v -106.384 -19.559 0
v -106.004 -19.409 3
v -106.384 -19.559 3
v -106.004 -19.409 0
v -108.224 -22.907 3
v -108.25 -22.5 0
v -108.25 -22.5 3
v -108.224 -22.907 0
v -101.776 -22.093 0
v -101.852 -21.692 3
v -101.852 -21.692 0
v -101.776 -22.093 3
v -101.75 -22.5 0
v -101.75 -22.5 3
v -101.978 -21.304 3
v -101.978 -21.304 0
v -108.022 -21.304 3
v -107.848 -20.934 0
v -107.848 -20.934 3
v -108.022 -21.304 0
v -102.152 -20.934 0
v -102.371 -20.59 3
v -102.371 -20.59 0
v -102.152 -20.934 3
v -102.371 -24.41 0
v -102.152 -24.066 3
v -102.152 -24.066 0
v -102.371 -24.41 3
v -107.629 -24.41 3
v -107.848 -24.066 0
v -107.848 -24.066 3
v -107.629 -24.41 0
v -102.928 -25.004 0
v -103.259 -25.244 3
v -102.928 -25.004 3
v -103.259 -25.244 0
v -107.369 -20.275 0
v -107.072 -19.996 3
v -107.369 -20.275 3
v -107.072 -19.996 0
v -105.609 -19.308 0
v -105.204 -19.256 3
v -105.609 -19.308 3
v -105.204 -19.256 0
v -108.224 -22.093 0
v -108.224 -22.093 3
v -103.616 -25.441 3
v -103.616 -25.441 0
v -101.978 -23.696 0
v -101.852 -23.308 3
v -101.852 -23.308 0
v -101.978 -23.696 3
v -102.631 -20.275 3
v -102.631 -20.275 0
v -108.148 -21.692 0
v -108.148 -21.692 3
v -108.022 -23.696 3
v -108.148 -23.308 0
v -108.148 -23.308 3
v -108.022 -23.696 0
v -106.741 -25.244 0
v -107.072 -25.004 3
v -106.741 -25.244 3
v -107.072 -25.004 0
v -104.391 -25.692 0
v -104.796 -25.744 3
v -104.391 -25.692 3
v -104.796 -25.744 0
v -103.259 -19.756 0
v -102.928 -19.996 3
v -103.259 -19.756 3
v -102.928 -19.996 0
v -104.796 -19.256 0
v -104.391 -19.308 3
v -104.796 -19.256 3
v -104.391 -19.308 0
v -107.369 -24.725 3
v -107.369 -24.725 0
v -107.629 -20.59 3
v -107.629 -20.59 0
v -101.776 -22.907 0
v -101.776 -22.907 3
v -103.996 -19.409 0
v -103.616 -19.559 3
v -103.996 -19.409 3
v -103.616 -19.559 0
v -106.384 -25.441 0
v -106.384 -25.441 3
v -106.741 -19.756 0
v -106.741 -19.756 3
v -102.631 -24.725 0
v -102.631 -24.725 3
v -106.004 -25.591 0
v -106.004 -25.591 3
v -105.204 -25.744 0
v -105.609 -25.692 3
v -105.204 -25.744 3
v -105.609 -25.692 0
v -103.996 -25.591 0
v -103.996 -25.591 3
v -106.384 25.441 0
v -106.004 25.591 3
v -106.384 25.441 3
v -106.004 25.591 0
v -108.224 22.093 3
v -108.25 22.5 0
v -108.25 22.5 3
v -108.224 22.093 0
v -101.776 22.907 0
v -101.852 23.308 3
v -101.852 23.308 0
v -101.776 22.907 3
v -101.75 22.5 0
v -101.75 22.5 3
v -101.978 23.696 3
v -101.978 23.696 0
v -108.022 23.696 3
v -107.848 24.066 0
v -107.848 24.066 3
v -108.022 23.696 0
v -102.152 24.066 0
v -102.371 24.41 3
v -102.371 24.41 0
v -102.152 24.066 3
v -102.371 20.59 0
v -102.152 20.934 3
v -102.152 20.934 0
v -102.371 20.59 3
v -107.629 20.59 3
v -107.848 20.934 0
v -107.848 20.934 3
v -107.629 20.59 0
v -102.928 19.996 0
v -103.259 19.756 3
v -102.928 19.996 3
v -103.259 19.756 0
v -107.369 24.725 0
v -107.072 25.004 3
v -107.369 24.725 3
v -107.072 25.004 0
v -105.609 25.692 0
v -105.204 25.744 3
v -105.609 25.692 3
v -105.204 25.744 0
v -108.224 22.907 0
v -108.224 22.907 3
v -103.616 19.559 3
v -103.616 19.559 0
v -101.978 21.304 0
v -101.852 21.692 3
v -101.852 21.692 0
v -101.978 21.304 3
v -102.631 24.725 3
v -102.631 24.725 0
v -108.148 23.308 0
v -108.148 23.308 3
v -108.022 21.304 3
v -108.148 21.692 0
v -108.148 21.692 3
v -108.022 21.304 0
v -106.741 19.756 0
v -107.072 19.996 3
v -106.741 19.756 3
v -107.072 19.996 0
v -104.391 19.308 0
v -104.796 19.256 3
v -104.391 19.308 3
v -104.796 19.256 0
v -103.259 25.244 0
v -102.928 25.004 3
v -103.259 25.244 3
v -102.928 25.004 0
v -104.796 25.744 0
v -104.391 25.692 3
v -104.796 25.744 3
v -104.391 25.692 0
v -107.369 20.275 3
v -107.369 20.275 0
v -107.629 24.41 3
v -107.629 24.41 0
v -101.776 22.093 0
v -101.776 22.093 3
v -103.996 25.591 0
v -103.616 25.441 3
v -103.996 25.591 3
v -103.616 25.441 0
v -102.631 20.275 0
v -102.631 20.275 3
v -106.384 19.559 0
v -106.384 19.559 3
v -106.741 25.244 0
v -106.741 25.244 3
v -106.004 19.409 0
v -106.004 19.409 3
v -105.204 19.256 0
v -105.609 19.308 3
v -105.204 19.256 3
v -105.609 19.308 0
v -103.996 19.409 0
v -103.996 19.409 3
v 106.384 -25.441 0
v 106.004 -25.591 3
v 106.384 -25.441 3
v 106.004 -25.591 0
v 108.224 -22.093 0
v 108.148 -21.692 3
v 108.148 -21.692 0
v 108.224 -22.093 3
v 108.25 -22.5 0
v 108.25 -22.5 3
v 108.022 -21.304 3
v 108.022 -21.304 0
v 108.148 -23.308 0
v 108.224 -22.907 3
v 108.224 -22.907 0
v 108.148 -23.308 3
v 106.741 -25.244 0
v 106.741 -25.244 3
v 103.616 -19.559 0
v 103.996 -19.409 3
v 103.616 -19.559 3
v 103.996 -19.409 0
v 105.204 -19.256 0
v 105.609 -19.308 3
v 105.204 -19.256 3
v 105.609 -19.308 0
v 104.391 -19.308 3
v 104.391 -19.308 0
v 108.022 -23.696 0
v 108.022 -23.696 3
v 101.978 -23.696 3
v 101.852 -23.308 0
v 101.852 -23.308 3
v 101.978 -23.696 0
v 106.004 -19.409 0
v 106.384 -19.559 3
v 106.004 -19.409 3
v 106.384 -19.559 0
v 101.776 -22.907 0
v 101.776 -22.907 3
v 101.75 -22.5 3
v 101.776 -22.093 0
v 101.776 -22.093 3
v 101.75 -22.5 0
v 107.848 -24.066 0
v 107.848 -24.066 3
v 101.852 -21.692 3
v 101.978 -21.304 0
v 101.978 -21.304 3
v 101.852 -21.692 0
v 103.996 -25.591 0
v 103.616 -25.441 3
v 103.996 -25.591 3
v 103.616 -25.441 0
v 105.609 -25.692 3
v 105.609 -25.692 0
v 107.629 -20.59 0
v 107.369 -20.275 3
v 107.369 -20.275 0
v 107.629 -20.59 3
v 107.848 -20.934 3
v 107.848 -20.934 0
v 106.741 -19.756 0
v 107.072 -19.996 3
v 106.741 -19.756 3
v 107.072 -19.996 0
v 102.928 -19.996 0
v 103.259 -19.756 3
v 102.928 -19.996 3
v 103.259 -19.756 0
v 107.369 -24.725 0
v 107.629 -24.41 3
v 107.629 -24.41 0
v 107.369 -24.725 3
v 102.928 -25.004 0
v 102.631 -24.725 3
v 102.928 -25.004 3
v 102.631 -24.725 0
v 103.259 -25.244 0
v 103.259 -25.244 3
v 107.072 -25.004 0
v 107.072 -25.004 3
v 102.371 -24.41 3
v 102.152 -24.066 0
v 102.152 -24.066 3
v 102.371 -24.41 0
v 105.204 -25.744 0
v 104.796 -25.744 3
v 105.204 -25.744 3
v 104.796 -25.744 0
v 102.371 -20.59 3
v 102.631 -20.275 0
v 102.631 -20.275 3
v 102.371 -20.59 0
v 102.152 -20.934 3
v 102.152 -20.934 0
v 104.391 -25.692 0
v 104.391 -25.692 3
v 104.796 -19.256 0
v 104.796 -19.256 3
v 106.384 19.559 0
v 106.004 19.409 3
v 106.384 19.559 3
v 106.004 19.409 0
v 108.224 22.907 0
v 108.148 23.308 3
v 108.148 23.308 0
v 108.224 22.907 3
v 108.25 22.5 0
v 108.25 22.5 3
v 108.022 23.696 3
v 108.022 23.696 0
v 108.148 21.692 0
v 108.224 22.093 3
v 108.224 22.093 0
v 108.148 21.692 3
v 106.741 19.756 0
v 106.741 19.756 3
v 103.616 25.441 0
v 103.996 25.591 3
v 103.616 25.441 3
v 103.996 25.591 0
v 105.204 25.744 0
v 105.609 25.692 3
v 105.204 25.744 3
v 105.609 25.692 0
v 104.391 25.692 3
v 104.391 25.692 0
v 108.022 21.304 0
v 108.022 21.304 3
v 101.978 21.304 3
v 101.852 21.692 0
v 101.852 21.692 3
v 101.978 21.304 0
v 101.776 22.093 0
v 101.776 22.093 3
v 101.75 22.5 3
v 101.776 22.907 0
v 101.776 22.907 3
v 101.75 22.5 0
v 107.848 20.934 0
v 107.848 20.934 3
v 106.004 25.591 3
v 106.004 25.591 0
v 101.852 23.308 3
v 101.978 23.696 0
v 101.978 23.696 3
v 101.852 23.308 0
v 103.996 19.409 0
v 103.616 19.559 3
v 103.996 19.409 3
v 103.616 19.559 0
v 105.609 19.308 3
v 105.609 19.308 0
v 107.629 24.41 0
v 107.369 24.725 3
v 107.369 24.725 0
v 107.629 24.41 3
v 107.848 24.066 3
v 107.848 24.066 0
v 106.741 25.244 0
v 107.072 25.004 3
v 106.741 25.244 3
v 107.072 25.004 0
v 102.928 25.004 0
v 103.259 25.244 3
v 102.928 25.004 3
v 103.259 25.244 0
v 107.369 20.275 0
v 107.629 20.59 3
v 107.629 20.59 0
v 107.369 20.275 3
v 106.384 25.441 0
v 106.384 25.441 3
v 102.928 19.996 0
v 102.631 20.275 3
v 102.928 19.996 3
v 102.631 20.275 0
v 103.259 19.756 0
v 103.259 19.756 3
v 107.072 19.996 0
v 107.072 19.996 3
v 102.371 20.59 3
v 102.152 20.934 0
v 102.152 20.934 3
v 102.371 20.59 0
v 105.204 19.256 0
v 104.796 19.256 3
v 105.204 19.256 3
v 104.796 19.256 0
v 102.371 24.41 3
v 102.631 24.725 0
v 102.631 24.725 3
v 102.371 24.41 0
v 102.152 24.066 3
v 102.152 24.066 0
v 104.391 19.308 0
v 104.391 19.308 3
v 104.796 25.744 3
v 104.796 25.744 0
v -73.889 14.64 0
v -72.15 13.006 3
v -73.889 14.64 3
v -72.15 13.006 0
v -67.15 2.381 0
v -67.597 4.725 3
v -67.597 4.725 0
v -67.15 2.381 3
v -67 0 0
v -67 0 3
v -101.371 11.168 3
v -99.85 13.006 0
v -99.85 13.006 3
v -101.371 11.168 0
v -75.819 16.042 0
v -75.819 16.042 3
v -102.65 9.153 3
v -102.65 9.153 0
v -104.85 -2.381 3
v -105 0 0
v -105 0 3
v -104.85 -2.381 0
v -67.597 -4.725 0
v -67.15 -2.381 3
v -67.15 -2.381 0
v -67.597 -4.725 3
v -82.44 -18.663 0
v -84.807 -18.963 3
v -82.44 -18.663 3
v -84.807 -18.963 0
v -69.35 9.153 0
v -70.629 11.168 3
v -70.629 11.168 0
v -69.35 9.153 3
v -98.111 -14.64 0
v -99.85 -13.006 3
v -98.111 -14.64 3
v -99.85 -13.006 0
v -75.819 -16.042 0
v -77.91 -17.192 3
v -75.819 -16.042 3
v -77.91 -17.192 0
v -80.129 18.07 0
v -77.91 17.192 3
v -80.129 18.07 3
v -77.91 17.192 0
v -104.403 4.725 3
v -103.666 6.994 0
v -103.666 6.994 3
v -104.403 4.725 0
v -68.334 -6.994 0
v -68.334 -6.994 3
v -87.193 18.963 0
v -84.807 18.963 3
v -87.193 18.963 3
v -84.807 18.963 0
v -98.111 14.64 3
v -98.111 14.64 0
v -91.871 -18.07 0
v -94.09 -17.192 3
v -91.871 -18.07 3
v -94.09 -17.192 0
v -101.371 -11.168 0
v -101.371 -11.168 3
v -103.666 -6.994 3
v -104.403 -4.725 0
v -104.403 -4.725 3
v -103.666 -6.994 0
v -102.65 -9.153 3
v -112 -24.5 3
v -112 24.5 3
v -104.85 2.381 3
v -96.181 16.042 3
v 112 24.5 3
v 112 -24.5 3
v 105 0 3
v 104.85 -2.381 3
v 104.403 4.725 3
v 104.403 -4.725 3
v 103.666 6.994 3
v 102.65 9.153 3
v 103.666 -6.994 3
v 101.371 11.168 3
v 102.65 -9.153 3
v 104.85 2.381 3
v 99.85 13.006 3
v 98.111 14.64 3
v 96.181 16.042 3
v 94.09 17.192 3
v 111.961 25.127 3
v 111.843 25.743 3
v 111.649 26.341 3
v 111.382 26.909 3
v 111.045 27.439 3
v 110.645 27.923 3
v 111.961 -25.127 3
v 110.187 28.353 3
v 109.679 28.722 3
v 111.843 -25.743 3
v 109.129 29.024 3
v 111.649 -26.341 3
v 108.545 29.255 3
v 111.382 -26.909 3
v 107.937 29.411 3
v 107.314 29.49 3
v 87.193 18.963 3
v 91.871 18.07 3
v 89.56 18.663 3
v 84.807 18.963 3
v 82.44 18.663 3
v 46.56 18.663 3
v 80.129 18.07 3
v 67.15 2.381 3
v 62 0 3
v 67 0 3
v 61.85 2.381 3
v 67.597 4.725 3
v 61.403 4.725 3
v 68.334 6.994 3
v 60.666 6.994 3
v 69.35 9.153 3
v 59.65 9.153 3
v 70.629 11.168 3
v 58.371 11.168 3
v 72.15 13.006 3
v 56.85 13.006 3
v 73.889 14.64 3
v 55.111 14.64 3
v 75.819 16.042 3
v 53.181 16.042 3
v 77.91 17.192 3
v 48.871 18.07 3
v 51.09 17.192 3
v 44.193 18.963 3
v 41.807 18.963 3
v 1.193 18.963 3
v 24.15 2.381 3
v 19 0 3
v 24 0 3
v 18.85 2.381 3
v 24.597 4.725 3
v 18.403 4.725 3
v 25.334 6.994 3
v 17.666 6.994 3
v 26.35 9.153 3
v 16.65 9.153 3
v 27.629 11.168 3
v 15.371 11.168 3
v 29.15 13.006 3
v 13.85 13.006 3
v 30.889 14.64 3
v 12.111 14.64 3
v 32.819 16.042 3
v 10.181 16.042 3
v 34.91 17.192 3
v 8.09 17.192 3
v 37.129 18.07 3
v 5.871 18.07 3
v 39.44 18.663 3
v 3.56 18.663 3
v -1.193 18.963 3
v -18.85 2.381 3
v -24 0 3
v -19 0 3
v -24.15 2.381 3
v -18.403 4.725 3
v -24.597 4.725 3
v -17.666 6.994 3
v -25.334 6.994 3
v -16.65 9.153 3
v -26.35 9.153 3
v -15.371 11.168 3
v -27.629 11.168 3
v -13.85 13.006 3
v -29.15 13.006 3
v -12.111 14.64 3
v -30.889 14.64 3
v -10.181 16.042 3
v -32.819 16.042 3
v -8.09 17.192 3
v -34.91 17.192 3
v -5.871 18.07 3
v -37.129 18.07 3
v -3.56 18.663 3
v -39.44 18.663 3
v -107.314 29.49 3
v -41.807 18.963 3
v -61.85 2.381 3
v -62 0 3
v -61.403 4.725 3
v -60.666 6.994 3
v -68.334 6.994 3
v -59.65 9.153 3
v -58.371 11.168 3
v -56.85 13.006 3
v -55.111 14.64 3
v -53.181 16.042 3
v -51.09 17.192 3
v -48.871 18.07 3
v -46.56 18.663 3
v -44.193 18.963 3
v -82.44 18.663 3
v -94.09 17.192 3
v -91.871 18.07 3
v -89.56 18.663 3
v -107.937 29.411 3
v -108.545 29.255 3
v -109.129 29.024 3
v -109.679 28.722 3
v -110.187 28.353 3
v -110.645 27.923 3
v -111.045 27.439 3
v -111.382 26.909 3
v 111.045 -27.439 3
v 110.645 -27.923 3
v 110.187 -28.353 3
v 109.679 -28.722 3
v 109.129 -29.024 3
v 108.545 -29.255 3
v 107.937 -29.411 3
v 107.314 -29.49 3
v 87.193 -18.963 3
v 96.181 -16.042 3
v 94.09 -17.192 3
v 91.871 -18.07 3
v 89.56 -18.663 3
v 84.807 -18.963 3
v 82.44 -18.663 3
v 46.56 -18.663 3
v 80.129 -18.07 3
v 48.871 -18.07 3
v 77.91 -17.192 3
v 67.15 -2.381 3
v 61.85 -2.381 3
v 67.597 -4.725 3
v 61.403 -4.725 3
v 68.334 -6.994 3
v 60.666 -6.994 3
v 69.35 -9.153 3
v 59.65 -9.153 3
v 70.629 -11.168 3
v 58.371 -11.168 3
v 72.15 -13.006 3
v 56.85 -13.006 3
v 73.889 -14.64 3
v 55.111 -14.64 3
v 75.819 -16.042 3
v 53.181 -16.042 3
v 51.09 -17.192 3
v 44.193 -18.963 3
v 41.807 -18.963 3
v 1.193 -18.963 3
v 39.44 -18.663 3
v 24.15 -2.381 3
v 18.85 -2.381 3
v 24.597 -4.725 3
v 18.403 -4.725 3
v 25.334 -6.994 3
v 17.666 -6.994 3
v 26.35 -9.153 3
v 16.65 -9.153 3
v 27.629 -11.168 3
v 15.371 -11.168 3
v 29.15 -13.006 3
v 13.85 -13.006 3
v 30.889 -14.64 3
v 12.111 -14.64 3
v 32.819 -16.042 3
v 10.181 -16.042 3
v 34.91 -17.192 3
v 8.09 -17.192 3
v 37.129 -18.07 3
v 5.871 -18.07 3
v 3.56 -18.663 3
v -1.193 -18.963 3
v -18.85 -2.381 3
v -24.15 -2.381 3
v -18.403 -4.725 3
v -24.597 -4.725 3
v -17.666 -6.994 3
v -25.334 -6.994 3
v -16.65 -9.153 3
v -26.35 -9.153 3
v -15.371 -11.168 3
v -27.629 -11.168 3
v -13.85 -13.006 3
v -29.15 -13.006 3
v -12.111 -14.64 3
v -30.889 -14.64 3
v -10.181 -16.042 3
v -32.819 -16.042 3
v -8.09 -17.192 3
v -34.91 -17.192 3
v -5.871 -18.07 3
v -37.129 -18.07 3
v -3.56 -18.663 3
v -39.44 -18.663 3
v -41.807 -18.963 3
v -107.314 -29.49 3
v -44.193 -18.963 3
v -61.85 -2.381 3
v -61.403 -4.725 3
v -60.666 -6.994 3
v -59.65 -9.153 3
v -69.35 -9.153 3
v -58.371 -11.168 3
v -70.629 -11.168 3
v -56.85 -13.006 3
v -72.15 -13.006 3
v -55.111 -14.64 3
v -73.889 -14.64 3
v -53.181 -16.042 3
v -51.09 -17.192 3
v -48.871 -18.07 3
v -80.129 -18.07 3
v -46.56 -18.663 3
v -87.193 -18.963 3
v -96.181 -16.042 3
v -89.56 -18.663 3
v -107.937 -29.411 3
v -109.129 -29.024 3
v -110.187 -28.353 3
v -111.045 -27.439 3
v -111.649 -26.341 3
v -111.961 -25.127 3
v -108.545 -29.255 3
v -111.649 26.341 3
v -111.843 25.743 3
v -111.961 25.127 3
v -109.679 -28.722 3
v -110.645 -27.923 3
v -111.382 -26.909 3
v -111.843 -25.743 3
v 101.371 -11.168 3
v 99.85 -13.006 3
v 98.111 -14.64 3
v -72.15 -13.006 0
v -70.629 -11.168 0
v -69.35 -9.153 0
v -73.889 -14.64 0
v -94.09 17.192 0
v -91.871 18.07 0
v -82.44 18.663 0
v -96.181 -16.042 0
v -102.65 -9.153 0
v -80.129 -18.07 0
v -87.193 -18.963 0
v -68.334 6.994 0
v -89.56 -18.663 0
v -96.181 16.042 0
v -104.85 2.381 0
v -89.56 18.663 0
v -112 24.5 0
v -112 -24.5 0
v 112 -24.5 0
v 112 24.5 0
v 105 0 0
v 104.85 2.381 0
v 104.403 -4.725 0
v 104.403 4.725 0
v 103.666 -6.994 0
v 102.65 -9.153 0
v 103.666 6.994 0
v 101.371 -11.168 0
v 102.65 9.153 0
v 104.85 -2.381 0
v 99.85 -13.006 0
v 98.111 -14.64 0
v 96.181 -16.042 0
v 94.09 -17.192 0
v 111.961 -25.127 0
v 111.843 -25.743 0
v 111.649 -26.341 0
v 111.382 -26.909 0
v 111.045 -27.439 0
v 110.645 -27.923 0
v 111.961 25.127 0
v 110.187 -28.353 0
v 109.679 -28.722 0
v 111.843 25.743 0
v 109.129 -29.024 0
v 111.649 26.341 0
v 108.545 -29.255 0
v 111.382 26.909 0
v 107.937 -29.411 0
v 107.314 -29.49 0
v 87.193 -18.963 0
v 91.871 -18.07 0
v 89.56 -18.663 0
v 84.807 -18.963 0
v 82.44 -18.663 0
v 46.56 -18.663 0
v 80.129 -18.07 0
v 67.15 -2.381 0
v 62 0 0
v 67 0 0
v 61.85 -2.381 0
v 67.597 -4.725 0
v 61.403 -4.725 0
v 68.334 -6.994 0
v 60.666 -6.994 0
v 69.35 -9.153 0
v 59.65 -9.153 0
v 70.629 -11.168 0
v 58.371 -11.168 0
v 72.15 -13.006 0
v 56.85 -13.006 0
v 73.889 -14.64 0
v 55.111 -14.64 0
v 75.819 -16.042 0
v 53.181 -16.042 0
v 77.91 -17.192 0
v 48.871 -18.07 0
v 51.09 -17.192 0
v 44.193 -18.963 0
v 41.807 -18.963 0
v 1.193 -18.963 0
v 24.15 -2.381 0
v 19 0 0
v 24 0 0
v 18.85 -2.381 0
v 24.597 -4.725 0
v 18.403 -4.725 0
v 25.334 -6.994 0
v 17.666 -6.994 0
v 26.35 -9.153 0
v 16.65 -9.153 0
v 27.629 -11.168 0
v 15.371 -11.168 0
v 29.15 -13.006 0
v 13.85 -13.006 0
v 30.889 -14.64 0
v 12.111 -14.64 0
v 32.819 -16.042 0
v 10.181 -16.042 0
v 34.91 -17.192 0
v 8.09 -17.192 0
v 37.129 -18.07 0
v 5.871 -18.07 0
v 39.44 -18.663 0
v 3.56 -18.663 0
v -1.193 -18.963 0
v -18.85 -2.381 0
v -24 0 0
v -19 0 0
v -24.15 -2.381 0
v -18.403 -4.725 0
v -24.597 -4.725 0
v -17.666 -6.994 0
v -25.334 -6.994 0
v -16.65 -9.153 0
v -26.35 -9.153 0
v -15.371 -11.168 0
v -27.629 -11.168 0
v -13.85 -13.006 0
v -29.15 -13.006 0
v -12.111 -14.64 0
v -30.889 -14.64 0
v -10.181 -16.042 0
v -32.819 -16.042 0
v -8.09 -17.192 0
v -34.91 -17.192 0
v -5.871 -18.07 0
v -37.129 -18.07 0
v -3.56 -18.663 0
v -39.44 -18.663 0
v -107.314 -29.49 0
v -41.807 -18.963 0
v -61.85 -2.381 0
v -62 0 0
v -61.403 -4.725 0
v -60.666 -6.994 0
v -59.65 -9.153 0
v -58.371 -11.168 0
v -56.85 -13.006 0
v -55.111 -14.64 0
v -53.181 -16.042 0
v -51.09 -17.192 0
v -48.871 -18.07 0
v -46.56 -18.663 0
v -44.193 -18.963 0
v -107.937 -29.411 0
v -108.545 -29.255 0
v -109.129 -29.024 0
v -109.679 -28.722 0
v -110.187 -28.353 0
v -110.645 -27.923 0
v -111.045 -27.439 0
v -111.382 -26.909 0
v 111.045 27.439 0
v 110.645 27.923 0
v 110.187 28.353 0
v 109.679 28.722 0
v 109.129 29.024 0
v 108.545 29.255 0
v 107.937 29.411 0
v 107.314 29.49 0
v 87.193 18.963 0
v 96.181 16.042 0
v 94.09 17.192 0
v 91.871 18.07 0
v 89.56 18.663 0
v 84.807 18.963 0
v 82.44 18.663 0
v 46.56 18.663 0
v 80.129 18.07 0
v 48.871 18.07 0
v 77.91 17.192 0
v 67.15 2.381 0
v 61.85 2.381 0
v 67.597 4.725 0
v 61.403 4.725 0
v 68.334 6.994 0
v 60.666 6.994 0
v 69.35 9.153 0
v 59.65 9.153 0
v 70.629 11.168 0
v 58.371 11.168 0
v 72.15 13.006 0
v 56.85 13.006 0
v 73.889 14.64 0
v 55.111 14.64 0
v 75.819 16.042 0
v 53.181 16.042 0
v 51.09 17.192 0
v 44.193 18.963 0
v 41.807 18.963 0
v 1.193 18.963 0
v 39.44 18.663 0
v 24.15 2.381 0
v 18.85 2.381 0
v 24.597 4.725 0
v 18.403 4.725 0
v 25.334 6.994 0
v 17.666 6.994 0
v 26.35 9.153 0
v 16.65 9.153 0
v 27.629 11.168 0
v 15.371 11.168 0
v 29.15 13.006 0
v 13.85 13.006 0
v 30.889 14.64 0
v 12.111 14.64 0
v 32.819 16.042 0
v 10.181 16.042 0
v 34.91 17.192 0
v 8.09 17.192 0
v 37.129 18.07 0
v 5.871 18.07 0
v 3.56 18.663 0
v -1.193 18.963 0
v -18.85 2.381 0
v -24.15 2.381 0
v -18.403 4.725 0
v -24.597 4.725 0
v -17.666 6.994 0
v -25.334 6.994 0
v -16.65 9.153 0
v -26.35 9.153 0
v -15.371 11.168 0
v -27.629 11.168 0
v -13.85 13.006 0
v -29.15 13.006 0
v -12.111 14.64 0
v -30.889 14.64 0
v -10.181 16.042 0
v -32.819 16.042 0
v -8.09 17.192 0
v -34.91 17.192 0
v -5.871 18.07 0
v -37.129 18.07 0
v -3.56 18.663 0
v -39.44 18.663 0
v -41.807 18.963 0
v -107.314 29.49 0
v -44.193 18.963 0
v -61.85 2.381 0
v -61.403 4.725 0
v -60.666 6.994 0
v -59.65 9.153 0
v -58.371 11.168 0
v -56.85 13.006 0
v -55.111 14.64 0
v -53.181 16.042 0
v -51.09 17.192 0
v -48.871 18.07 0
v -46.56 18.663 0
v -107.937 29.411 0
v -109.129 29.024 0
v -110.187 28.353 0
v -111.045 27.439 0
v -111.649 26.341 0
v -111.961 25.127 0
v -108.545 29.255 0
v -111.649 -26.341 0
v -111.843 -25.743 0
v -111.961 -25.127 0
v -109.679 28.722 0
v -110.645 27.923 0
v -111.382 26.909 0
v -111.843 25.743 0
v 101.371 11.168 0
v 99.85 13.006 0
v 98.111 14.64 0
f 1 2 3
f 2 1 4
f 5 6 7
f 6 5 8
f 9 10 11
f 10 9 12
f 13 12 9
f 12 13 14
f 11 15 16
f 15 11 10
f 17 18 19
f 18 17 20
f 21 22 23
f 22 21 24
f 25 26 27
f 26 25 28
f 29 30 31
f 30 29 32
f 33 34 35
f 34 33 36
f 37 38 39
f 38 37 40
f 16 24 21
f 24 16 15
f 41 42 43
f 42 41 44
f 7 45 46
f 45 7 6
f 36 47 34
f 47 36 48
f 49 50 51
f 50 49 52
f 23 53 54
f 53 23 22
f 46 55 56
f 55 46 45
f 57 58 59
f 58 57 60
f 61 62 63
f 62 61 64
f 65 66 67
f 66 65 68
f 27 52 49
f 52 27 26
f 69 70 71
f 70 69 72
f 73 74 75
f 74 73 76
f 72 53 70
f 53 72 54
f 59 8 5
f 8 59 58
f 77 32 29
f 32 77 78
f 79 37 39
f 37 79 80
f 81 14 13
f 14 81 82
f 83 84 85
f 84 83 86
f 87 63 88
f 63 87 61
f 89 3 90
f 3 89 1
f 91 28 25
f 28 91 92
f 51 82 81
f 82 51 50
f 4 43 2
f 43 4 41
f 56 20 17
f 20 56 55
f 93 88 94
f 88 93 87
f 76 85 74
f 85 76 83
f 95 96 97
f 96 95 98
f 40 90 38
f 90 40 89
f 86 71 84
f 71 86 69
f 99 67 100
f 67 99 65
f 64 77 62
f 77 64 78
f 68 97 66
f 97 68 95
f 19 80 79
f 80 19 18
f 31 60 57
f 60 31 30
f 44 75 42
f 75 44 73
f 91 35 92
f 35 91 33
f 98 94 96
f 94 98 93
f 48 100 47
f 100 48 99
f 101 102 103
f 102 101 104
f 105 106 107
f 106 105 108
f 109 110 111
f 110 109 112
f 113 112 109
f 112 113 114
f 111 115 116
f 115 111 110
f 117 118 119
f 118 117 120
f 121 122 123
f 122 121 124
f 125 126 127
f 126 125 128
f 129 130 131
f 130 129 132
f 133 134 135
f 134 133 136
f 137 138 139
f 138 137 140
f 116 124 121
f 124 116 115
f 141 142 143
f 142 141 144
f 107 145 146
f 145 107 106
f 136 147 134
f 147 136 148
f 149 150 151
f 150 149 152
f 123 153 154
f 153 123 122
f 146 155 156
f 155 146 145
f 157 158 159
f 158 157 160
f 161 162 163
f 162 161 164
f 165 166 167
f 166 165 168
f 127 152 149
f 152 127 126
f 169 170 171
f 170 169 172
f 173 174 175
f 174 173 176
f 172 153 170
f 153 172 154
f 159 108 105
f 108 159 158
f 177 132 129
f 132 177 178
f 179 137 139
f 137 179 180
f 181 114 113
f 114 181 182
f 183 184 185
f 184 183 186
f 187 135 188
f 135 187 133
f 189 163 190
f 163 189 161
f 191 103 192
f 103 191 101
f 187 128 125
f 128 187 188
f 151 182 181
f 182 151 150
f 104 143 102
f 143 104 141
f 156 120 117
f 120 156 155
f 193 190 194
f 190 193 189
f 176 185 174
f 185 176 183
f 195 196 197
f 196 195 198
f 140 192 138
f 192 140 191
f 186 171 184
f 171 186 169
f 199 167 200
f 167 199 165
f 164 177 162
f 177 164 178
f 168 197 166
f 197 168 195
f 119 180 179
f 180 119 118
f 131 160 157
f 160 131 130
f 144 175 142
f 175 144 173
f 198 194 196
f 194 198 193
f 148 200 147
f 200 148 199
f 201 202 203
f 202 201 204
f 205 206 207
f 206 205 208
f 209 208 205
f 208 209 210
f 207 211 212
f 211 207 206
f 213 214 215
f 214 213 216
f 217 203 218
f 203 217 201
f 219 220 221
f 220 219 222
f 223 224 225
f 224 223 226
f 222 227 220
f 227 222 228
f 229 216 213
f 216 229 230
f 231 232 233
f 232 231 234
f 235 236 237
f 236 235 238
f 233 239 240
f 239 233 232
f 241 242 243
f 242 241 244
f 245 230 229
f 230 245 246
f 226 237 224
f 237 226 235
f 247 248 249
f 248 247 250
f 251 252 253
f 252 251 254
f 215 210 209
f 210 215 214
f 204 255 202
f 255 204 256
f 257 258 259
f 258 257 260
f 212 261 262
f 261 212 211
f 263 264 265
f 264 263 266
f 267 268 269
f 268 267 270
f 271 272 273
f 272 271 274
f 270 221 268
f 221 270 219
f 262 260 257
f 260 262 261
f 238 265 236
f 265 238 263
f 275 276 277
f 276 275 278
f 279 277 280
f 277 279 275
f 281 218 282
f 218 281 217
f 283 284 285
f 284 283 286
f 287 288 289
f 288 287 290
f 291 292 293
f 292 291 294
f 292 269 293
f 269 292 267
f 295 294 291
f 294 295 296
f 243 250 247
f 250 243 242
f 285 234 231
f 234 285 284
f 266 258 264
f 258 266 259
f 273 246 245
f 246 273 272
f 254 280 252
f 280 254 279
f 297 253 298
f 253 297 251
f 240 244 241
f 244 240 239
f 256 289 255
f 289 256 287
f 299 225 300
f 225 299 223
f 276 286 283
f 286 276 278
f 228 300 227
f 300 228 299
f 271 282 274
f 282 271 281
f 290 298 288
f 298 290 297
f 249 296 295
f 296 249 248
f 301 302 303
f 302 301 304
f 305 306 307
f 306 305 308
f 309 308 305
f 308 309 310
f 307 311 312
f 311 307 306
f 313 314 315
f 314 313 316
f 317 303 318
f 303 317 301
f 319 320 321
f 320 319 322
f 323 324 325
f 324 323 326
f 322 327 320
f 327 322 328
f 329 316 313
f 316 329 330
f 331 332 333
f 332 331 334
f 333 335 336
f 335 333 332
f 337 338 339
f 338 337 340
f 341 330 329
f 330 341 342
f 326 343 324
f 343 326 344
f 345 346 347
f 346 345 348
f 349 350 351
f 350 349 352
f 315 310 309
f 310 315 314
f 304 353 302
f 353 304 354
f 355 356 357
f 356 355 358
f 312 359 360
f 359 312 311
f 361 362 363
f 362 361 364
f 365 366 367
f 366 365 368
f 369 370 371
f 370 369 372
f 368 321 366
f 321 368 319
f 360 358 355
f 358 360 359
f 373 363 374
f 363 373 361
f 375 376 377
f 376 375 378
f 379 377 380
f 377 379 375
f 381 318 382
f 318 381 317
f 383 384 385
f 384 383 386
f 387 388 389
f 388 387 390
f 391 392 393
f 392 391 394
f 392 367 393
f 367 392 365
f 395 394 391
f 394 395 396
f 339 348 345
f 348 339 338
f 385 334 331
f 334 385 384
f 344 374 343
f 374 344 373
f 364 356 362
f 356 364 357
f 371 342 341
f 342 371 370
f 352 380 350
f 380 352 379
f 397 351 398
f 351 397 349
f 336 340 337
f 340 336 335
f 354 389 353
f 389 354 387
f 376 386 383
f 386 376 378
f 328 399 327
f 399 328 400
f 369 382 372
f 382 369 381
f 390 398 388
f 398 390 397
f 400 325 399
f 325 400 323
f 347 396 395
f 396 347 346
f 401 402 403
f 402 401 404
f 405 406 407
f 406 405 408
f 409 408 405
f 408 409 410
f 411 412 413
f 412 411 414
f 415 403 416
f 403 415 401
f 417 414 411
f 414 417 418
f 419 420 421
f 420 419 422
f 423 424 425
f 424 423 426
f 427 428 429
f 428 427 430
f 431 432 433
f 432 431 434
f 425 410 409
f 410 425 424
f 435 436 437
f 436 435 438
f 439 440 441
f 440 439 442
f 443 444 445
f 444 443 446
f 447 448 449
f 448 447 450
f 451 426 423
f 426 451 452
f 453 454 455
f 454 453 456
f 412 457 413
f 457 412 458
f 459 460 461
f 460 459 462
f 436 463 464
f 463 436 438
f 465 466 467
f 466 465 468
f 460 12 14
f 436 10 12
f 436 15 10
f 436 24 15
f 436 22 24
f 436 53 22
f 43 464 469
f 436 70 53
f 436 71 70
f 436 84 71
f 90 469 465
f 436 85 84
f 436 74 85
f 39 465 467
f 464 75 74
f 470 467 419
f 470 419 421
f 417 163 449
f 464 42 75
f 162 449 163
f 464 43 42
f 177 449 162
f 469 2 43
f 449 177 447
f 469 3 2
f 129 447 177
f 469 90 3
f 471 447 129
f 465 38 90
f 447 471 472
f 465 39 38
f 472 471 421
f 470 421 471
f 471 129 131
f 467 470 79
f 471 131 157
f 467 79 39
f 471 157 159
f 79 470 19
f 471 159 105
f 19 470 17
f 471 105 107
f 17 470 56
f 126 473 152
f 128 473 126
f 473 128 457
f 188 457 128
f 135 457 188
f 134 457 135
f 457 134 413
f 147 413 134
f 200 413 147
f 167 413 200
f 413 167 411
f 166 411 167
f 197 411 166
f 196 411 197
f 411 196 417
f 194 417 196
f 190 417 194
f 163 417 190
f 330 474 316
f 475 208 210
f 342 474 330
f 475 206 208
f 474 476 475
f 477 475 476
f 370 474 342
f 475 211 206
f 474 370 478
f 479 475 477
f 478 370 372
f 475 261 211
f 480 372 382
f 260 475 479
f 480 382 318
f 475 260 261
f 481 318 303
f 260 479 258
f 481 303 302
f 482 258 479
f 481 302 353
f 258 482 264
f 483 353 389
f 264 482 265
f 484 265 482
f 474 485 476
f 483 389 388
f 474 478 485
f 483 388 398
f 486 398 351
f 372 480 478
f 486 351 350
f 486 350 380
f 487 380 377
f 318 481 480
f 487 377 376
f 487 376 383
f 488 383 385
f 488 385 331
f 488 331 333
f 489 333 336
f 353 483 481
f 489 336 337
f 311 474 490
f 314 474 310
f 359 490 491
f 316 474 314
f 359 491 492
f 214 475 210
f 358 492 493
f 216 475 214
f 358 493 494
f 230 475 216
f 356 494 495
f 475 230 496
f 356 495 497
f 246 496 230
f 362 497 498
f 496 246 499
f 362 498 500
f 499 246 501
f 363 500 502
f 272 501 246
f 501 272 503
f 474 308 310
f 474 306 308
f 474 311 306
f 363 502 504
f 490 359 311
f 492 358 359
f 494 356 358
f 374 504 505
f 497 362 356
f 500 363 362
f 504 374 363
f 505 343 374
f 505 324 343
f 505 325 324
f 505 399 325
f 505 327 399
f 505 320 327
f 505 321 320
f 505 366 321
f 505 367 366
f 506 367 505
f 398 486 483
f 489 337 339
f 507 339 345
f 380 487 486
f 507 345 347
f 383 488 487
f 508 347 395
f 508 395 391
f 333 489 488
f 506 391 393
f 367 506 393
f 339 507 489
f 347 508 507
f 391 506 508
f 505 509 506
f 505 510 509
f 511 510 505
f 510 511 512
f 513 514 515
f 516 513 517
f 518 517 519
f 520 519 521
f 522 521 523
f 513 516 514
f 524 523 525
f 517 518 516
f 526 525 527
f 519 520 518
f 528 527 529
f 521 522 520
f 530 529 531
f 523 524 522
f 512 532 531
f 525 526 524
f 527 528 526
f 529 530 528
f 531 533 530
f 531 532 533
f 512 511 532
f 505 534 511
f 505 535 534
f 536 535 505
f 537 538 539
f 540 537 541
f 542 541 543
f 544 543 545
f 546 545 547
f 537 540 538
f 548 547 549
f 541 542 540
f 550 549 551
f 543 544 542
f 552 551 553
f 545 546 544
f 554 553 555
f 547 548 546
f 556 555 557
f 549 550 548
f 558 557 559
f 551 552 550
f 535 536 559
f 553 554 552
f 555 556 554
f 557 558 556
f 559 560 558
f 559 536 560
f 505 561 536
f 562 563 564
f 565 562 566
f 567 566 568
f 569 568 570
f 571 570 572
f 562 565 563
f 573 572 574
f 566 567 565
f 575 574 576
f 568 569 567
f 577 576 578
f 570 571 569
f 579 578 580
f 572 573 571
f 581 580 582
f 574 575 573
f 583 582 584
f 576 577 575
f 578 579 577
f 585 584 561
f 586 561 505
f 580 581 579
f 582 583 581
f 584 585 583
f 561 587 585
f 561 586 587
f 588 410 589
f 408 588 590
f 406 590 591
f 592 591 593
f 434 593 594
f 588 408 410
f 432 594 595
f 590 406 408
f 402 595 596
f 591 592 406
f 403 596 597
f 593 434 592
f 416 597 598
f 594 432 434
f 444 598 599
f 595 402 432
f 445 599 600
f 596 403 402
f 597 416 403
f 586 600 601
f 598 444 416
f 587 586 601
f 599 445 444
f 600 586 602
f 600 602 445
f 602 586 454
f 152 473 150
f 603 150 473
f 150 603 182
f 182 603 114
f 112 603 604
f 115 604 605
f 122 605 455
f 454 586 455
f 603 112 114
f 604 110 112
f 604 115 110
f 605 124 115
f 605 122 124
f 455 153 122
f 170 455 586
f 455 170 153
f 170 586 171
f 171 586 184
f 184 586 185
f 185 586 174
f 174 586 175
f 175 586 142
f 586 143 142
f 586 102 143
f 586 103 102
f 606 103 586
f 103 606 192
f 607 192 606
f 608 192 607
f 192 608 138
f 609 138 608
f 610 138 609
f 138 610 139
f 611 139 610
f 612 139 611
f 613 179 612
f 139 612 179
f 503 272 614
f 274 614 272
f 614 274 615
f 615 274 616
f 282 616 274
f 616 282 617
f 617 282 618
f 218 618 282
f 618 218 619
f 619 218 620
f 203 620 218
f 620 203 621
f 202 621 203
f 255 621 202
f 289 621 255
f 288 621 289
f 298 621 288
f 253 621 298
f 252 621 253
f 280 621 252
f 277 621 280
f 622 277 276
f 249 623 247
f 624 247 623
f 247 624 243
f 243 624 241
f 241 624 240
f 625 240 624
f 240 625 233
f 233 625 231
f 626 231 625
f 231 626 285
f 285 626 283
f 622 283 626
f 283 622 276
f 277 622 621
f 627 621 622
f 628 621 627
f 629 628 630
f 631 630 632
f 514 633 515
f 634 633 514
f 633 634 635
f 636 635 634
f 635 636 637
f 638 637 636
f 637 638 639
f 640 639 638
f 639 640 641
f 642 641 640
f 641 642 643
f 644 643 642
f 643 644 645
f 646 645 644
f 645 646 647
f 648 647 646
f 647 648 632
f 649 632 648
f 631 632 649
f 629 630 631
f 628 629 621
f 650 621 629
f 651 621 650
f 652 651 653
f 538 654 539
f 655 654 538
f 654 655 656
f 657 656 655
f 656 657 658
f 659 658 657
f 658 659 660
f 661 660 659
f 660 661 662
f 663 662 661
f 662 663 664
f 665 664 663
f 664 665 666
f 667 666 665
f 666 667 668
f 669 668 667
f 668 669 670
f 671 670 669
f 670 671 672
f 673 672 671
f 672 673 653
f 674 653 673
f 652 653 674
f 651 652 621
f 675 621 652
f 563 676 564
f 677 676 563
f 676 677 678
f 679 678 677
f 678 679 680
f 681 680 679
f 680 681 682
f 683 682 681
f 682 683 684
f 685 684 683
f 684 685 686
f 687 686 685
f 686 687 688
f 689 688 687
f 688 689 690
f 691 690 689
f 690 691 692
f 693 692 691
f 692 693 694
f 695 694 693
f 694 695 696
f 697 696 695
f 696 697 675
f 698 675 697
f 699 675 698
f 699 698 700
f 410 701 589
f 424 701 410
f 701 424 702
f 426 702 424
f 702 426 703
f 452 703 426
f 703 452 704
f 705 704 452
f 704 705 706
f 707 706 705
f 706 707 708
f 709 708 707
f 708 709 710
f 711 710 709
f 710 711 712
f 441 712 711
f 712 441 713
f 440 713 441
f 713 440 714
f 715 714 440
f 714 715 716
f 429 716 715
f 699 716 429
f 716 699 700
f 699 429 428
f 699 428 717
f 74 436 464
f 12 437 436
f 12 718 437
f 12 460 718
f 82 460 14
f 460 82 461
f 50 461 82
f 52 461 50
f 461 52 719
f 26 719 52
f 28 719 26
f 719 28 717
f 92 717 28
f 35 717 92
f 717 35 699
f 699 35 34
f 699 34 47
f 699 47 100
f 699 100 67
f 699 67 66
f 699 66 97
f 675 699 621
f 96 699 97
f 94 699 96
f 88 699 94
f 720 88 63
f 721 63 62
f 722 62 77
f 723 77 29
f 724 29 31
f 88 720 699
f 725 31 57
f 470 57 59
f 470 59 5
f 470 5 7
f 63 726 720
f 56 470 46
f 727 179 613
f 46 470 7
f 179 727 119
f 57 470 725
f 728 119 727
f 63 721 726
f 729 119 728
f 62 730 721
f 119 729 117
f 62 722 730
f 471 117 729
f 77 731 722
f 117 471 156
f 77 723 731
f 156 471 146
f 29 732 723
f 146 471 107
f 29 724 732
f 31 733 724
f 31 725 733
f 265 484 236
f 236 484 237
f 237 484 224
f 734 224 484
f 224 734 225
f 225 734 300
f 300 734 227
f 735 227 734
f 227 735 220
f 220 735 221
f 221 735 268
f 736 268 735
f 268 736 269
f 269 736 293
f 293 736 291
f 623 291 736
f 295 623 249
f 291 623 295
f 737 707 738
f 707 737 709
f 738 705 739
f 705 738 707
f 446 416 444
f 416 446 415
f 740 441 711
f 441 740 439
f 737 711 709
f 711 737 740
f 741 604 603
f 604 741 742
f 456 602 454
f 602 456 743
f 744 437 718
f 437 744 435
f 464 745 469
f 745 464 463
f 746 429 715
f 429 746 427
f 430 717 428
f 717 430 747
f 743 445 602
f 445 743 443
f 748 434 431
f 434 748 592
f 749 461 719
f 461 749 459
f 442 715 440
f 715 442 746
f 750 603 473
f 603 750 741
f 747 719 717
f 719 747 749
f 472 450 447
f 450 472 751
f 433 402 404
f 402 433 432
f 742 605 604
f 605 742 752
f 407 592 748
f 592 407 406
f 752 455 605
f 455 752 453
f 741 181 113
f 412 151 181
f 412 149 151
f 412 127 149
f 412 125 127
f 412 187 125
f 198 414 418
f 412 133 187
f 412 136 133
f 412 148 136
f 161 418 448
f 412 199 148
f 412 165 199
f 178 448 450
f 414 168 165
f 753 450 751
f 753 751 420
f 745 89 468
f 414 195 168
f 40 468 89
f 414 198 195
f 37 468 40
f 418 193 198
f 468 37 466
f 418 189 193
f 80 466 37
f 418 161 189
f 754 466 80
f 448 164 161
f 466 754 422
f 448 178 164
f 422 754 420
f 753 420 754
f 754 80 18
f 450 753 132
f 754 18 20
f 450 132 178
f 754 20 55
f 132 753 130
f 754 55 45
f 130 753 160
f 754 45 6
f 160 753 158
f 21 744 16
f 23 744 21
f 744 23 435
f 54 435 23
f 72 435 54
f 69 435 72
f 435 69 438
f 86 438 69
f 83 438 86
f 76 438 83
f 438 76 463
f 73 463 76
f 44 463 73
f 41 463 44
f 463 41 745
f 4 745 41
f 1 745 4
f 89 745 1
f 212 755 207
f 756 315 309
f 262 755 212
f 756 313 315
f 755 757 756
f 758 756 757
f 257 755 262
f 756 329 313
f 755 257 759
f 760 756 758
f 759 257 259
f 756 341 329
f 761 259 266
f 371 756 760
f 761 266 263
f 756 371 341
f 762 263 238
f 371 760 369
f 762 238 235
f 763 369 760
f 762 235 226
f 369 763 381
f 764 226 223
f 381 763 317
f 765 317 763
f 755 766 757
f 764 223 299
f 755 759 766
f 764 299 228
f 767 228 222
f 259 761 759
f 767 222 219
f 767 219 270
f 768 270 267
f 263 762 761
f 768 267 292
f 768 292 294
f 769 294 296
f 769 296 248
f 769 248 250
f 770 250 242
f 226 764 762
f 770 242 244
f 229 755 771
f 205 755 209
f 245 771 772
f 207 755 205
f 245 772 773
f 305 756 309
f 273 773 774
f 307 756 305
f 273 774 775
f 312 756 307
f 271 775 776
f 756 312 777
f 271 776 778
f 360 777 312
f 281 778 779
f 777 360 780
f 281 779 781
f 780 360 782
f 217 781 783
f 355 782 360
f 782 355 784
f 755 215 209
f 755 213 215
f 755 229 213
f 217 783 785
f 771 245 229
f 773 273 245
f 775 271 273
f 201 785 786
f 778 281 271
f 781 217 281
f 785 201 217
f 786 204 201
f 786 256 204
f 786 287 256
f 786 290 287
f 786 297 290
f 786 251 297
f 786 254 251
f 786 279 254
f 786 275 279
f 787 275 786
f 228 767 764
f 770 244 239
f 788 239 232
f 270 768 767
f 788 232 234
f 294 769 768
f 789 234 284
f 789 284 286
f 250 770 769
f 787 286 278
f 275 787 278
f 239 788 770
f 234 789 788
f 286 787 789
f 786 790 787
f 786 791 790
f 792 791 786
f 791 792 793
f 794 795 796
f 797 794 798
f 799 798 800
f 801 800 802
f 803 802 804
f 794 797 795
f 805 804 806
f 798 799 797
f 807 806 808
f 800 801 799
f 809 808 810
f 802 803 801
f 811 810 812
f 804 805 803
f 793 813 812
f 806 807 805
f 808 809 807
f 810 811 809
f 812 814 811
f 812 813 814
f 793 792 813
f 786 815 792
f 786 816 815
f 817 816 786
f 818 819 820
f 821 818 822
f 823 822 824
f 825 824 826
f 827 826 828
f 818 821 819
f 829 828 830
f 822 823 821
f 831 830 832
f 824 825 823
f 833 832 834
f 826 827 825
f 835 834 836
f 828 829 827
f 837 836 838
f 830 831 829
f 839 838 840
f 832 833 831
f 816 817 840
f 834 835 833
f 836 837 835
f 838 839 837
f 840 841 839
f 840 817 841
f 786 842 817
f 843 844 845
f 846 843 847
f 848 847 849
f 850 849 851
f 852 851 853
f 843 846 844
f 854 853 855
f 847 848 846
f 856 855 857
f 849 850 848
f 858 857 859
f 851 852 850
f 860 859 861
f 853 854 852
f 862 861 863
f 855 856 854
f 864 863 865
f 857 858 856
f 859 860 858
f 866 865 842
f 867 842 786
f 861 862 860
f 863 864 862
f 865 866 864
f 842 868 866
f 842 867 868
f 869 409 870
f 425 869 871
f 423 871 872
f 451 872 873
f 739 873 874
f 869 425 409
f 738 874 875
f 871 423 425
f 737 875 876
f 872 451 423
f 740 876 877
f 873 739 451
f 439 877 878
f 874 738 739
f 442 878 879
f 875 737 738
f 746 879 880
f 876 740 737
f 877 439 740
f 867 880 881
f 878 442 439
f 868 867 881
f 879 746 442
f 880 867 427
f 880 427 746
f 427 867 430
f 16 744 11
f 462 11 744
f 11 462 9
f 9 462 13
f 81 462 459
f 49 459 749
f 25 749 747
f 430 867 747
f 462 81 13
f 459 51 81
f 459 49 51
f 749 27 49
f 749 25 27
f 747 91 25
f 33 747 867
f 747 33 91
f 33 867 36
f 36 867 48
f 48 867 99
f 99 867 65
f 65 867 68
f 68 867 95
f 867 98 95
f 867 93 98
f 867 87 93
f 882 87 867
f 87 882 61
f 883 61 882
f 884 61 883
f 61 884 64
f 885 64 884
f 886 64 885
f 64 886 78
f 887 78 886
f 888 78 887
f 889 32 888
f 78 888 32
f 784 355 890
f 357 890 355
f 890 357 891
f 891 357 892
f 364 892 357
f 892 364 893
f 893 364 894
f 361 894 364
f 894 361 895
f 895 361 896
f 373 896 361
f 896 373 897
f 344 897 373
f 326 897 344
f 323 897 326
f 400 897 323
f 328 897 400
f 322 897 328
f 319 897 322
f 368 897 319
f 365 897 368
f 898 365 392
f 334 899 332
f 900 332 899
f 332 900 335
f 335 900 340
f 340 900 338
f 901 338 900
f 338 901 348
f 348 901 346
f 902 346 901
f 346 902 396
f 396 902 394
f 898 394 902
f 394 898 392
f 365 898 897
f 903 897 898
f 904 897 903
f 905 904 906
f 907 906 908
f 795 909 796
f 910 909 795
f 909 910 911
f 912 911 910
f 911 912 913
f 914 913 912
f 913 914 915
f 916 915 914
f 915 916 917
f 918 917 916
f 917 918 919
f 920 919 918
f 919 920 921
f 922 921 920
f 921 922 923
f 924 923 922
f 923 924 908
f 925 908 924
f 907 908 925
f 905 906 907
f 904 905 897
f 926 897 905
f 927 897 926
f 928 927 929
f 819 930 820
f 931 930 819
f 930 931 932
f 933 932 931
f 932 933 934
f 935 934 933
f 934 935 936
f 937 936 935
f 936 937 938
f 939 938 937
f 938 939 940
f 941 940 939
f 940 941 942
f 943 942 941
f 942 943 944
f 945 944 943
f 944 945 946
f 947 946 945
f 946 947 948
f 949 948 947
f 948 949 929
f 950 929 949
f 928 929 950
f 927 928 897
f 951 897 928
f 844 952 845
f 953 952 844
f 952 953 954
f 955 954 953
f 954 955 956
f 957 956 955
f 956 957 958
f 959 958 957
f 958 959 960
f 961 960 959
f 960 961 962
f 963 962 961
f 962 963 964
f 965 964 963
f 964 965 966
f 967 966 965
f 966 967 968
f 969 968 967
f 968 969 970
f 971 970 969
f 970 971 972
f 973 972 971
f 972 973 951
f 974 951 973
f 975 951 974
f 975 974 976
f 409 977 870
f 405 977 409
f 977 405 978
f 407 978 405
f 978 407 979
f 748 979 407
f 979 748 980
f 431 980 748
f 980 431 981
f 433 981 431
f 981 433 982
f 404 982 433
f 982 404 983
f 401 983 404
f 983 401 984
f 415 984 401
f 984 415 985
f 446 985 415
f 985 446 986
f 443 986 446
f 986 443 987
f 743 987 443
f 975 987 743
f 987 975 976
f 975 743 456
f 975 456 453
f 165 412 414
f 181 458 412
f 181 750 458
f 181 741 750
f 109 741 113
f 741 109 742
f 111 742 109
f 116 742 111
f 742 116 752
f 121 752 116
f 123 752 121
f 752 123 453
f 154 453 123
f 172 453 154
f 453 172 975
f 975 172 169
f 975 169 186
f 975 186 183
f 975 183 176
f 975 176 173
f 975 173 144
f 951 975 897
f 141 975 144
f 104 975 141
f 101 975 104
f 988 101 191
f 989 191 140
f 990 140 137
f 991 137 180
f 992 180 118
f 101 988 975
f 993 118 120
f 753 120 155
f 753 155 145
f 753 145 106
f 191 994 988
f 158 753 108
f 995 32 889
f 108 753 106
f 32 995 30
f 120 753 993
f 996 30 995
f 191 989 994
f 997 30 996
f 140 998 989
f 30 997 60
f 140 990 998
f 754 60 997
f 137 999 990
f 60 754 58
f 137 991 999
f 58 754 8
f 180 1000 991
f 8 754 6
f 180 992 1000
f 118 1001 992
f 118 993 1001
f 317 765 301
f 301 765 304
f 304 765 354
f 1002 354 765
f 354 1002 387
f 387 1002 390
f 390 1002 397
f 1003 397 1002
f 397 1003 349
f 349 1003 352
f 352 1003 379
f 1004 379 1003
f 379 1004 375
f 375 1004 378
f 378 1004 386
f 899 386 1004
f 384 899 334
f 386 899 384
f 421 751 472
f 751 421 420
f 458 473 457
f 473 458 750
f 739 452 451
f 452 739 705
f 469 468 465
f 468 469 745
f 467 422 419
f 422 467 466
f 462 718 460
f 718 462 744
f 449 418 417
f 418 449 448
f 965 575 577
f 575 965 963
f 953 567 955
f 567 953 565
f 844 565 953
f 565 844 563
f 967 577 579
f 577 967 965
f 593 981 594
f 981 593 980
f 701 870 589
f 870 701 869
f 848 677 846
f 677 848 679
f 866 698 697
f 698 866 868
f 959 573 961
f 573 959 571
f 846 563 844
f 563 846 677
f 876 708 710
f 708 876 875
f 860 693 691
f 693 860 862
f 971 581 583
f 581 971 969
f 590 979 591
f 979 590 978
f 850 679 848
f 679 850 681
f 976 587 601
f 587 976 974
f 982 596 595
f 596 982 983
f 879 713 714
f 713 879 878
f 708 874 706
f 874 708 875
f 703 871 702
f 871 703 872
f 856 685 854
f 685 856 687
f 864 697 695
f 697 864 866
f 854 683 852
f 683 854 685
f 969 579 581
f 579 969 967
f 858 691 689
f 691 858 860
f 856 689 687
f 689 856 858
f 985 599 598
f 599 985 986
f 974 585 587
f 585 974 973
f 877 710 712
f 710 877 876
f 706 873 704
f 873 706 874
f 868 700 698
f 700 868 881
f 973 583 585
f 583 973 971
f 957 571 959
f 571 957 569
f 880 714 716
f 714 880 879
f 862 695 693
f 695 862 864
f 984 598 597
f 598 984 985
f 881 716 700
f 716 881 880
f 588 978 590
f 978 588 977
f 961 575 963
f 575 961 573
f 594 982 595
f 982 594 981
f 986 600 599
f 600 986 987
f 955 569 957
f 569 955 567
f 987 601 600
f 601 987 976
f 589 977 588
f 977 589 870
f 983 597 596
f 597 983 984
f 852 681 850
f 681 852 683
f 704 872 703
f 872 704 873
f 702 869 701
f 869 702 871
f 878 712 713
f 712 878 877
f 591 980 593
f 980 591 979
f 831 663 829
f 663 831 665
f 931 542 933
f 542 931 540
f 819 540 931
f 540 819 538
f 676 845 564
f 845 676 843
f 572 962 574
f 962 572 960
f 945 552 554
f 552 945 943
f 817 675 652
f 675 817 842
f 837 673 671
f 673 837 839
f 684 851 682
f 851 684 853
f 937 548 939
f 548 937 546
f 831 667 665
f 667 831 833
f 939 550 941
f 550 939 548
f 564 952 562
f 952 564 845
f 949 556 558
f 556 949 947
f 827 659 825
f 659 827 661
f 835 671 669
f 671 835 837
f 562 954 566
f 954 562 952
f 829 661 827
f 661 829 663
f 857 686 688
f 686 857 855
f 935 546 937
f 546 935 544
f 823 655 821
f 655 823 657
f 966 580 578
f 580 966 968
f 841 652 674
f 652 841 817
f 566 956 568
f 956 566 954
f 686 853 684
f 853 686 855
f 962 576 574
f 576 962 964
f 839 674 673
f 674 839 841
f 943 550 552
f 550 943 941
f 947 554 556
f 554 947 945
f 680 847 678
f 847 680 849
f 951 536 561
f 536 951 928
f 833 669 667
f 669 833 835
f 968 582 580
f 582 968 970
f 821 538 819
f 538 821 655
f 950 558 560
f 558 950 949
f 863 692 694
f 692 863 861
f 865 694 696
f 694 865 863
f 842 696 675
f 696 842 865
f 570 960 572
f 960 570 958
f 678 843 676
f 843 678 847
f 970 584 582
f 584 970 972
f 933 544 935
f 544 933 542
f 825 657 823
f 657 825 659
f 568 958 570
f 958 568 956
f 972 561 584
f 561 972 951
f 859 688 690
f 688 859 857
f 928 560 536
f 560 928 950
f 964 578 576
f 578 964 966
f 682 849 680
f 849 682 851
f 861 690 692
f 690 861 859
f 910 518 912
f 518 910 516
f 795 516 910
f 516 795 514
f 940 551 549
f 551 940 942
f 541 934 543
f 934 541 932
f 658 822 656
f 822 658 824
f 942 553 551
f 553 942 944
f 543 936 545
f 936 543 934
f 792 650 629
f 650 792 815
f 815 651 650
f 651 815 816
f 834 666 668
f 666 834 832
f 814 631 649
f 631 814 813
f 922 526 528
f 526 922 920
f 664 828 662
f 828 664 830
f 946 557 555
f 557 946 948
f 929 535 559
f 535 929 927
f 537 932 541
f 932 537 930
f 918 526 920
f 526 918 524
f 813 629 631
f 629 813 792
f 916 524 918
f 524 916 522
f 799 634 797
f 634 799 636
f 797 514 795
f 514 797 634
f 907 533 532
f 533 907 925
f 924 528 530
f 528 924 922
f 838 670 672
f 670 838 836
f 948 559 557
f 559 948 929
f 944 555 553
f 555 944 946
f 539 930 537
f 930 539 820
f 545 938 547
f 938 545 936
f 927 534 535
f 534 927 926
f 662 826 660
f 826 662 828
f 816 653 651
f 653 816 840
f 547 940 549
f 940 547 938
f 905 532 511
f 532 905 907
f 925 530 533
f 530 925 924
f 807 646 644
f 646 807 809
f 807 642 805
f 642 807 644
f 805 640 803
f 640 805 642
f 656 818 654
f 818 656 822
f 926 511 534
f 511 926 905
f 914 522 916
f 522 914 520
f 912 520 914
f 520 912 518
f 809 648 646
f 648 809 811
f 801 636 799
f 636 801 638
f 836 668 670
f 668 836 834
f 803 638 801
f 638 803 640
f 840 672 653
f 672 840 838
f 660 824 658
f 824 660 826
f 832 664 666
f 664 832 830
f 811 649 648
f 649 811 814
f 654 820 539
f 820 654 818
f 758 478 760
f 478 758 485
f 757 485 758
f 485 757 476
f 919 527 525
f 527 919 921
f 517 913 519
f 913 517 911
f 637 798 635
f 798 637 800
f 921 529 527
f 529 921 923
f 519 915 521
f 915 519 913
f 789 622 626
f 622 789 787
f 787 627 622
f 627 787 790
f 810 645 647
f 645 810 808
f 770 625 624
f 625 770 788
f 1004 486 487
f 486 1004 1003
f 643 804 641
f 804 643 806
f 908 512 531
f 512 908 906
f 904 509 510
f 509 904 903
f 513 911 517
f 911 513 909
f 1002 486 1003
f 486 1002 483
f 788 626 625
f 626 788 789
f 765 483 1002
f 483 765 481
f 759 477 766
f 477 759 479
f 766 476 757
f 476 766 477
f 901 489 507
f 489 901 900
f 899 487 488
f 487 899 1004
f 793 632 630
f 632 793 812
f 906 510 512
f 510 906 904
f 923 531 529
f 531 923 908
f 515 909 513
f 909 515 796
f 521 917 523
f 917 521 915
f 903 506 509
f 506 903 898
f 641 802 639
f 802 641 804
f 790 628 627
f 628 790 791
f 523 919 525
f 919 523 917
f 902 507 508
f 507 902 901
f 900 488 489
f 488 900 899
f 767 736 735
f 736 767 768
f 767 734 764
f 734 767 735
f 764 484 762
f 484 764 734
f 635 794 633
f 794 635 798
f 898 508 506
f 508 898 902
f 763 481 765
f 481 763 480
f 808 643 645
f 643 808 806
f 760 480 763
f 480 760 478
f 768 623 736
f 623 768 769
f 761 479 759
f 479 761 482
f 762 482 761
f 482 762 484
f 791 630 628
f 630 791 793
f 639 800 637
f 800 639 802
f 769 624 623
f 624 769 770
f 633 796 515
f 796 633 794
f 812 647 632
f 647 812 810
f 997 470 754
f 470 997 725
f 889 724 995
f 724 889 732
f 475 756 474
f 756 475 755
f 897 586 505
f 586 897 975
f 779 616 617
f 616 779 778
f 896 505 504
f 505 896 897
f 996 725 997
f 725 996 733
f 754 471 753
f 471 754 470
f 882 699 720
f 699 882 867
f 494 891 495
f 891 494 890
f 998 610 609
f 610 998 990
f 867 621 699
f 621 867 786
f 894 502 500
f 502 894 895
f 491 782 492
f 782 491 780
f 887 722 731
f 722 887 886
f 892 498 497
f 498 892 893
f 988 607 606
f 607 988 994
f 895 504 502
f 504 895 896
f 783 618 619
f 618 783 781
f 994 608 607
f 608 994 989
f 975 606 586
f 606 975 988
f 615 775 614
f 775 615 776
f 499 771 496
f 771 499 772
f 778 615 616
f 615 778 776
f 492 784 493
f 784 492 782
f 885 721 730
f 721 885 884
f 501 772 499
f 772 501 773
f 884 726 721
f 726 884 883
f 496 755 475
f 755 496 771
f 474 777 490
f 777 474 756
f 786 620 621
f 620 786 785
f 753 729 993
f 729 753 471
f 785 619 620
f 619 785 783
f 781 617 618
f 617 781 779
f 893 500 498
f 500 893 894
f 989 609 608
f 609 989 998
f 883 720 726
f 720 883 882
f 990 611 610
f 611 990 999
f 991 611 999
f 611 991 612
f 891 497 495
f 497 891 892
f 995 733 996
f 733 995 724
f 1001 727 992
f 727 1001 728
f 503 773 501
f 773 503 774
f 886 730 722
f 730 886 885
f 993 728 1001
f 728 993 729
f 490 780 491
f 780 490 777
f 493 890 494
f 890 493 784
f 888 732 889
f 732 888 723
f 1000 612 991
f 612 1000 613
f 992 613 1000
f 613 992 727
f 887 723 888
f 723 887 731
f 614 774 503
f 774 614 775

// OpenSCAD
$fn = 50;


difference() {
	union() {
		hull() {
			translate(v = [-107.0000000000, 24.5000000000, 0]) {
				cylinder(h = 3, r = 5);
			}
			translate(v = [107.0000000000, 24.5000000000, 0]) {
				cylinder(h = 3, r = 5);
			}
			translate(v = [-107.0000000000, -24.5000000000, 0]) {
				cylinder(h = 3, r = 5);
			}
			translate(v = [107.0000000000, -24.5000000000, 0]) {
				cylinder(h = 3, r = 5);
			}
		}
	}
	union() {
		#translate(v = [-105.0000000000, -22.5000000000, -100.0000000000]) {
			cylinder(h = 200, r = 3.2500000000);
		}
		#translate(v = [-105.0000000000, 22.5000000000, -100.0000000000]) {
			cylinder(h = 200, r = 3.2500000000);
		}
		#translate(v = [105.0000000000, -22.5000000000, -100.0000000000]) {
			cylinder(h = 200, r = 3.2500000000);
		}
		#translate(v = [105.0000000000, 22.5000000000, -100.0000000000]) {
			cylinder(h = 200, r = 3.2500000000);
		}
		#translate(v = [-86.0000000000, 0, 0]) {
			cylinder(h = 3, r = 19.0000000000);
		}
		#translate(v = [-43.0000000000, 0, 0]) {
			cylinder(h = 3, r = 19.0000000000);
		}
		#cylinder(h = 3, r = 19.0000000000);
		#translate(v = [43.0000000000, 0, 0]) {
			cylinder(h = 3, r = 19.0000000000);
		}
		#translate(v = [86.0000000000, 0, 0]) {
			cylinder(h = 3, r = 19.0000000000);
		}
	}
}
